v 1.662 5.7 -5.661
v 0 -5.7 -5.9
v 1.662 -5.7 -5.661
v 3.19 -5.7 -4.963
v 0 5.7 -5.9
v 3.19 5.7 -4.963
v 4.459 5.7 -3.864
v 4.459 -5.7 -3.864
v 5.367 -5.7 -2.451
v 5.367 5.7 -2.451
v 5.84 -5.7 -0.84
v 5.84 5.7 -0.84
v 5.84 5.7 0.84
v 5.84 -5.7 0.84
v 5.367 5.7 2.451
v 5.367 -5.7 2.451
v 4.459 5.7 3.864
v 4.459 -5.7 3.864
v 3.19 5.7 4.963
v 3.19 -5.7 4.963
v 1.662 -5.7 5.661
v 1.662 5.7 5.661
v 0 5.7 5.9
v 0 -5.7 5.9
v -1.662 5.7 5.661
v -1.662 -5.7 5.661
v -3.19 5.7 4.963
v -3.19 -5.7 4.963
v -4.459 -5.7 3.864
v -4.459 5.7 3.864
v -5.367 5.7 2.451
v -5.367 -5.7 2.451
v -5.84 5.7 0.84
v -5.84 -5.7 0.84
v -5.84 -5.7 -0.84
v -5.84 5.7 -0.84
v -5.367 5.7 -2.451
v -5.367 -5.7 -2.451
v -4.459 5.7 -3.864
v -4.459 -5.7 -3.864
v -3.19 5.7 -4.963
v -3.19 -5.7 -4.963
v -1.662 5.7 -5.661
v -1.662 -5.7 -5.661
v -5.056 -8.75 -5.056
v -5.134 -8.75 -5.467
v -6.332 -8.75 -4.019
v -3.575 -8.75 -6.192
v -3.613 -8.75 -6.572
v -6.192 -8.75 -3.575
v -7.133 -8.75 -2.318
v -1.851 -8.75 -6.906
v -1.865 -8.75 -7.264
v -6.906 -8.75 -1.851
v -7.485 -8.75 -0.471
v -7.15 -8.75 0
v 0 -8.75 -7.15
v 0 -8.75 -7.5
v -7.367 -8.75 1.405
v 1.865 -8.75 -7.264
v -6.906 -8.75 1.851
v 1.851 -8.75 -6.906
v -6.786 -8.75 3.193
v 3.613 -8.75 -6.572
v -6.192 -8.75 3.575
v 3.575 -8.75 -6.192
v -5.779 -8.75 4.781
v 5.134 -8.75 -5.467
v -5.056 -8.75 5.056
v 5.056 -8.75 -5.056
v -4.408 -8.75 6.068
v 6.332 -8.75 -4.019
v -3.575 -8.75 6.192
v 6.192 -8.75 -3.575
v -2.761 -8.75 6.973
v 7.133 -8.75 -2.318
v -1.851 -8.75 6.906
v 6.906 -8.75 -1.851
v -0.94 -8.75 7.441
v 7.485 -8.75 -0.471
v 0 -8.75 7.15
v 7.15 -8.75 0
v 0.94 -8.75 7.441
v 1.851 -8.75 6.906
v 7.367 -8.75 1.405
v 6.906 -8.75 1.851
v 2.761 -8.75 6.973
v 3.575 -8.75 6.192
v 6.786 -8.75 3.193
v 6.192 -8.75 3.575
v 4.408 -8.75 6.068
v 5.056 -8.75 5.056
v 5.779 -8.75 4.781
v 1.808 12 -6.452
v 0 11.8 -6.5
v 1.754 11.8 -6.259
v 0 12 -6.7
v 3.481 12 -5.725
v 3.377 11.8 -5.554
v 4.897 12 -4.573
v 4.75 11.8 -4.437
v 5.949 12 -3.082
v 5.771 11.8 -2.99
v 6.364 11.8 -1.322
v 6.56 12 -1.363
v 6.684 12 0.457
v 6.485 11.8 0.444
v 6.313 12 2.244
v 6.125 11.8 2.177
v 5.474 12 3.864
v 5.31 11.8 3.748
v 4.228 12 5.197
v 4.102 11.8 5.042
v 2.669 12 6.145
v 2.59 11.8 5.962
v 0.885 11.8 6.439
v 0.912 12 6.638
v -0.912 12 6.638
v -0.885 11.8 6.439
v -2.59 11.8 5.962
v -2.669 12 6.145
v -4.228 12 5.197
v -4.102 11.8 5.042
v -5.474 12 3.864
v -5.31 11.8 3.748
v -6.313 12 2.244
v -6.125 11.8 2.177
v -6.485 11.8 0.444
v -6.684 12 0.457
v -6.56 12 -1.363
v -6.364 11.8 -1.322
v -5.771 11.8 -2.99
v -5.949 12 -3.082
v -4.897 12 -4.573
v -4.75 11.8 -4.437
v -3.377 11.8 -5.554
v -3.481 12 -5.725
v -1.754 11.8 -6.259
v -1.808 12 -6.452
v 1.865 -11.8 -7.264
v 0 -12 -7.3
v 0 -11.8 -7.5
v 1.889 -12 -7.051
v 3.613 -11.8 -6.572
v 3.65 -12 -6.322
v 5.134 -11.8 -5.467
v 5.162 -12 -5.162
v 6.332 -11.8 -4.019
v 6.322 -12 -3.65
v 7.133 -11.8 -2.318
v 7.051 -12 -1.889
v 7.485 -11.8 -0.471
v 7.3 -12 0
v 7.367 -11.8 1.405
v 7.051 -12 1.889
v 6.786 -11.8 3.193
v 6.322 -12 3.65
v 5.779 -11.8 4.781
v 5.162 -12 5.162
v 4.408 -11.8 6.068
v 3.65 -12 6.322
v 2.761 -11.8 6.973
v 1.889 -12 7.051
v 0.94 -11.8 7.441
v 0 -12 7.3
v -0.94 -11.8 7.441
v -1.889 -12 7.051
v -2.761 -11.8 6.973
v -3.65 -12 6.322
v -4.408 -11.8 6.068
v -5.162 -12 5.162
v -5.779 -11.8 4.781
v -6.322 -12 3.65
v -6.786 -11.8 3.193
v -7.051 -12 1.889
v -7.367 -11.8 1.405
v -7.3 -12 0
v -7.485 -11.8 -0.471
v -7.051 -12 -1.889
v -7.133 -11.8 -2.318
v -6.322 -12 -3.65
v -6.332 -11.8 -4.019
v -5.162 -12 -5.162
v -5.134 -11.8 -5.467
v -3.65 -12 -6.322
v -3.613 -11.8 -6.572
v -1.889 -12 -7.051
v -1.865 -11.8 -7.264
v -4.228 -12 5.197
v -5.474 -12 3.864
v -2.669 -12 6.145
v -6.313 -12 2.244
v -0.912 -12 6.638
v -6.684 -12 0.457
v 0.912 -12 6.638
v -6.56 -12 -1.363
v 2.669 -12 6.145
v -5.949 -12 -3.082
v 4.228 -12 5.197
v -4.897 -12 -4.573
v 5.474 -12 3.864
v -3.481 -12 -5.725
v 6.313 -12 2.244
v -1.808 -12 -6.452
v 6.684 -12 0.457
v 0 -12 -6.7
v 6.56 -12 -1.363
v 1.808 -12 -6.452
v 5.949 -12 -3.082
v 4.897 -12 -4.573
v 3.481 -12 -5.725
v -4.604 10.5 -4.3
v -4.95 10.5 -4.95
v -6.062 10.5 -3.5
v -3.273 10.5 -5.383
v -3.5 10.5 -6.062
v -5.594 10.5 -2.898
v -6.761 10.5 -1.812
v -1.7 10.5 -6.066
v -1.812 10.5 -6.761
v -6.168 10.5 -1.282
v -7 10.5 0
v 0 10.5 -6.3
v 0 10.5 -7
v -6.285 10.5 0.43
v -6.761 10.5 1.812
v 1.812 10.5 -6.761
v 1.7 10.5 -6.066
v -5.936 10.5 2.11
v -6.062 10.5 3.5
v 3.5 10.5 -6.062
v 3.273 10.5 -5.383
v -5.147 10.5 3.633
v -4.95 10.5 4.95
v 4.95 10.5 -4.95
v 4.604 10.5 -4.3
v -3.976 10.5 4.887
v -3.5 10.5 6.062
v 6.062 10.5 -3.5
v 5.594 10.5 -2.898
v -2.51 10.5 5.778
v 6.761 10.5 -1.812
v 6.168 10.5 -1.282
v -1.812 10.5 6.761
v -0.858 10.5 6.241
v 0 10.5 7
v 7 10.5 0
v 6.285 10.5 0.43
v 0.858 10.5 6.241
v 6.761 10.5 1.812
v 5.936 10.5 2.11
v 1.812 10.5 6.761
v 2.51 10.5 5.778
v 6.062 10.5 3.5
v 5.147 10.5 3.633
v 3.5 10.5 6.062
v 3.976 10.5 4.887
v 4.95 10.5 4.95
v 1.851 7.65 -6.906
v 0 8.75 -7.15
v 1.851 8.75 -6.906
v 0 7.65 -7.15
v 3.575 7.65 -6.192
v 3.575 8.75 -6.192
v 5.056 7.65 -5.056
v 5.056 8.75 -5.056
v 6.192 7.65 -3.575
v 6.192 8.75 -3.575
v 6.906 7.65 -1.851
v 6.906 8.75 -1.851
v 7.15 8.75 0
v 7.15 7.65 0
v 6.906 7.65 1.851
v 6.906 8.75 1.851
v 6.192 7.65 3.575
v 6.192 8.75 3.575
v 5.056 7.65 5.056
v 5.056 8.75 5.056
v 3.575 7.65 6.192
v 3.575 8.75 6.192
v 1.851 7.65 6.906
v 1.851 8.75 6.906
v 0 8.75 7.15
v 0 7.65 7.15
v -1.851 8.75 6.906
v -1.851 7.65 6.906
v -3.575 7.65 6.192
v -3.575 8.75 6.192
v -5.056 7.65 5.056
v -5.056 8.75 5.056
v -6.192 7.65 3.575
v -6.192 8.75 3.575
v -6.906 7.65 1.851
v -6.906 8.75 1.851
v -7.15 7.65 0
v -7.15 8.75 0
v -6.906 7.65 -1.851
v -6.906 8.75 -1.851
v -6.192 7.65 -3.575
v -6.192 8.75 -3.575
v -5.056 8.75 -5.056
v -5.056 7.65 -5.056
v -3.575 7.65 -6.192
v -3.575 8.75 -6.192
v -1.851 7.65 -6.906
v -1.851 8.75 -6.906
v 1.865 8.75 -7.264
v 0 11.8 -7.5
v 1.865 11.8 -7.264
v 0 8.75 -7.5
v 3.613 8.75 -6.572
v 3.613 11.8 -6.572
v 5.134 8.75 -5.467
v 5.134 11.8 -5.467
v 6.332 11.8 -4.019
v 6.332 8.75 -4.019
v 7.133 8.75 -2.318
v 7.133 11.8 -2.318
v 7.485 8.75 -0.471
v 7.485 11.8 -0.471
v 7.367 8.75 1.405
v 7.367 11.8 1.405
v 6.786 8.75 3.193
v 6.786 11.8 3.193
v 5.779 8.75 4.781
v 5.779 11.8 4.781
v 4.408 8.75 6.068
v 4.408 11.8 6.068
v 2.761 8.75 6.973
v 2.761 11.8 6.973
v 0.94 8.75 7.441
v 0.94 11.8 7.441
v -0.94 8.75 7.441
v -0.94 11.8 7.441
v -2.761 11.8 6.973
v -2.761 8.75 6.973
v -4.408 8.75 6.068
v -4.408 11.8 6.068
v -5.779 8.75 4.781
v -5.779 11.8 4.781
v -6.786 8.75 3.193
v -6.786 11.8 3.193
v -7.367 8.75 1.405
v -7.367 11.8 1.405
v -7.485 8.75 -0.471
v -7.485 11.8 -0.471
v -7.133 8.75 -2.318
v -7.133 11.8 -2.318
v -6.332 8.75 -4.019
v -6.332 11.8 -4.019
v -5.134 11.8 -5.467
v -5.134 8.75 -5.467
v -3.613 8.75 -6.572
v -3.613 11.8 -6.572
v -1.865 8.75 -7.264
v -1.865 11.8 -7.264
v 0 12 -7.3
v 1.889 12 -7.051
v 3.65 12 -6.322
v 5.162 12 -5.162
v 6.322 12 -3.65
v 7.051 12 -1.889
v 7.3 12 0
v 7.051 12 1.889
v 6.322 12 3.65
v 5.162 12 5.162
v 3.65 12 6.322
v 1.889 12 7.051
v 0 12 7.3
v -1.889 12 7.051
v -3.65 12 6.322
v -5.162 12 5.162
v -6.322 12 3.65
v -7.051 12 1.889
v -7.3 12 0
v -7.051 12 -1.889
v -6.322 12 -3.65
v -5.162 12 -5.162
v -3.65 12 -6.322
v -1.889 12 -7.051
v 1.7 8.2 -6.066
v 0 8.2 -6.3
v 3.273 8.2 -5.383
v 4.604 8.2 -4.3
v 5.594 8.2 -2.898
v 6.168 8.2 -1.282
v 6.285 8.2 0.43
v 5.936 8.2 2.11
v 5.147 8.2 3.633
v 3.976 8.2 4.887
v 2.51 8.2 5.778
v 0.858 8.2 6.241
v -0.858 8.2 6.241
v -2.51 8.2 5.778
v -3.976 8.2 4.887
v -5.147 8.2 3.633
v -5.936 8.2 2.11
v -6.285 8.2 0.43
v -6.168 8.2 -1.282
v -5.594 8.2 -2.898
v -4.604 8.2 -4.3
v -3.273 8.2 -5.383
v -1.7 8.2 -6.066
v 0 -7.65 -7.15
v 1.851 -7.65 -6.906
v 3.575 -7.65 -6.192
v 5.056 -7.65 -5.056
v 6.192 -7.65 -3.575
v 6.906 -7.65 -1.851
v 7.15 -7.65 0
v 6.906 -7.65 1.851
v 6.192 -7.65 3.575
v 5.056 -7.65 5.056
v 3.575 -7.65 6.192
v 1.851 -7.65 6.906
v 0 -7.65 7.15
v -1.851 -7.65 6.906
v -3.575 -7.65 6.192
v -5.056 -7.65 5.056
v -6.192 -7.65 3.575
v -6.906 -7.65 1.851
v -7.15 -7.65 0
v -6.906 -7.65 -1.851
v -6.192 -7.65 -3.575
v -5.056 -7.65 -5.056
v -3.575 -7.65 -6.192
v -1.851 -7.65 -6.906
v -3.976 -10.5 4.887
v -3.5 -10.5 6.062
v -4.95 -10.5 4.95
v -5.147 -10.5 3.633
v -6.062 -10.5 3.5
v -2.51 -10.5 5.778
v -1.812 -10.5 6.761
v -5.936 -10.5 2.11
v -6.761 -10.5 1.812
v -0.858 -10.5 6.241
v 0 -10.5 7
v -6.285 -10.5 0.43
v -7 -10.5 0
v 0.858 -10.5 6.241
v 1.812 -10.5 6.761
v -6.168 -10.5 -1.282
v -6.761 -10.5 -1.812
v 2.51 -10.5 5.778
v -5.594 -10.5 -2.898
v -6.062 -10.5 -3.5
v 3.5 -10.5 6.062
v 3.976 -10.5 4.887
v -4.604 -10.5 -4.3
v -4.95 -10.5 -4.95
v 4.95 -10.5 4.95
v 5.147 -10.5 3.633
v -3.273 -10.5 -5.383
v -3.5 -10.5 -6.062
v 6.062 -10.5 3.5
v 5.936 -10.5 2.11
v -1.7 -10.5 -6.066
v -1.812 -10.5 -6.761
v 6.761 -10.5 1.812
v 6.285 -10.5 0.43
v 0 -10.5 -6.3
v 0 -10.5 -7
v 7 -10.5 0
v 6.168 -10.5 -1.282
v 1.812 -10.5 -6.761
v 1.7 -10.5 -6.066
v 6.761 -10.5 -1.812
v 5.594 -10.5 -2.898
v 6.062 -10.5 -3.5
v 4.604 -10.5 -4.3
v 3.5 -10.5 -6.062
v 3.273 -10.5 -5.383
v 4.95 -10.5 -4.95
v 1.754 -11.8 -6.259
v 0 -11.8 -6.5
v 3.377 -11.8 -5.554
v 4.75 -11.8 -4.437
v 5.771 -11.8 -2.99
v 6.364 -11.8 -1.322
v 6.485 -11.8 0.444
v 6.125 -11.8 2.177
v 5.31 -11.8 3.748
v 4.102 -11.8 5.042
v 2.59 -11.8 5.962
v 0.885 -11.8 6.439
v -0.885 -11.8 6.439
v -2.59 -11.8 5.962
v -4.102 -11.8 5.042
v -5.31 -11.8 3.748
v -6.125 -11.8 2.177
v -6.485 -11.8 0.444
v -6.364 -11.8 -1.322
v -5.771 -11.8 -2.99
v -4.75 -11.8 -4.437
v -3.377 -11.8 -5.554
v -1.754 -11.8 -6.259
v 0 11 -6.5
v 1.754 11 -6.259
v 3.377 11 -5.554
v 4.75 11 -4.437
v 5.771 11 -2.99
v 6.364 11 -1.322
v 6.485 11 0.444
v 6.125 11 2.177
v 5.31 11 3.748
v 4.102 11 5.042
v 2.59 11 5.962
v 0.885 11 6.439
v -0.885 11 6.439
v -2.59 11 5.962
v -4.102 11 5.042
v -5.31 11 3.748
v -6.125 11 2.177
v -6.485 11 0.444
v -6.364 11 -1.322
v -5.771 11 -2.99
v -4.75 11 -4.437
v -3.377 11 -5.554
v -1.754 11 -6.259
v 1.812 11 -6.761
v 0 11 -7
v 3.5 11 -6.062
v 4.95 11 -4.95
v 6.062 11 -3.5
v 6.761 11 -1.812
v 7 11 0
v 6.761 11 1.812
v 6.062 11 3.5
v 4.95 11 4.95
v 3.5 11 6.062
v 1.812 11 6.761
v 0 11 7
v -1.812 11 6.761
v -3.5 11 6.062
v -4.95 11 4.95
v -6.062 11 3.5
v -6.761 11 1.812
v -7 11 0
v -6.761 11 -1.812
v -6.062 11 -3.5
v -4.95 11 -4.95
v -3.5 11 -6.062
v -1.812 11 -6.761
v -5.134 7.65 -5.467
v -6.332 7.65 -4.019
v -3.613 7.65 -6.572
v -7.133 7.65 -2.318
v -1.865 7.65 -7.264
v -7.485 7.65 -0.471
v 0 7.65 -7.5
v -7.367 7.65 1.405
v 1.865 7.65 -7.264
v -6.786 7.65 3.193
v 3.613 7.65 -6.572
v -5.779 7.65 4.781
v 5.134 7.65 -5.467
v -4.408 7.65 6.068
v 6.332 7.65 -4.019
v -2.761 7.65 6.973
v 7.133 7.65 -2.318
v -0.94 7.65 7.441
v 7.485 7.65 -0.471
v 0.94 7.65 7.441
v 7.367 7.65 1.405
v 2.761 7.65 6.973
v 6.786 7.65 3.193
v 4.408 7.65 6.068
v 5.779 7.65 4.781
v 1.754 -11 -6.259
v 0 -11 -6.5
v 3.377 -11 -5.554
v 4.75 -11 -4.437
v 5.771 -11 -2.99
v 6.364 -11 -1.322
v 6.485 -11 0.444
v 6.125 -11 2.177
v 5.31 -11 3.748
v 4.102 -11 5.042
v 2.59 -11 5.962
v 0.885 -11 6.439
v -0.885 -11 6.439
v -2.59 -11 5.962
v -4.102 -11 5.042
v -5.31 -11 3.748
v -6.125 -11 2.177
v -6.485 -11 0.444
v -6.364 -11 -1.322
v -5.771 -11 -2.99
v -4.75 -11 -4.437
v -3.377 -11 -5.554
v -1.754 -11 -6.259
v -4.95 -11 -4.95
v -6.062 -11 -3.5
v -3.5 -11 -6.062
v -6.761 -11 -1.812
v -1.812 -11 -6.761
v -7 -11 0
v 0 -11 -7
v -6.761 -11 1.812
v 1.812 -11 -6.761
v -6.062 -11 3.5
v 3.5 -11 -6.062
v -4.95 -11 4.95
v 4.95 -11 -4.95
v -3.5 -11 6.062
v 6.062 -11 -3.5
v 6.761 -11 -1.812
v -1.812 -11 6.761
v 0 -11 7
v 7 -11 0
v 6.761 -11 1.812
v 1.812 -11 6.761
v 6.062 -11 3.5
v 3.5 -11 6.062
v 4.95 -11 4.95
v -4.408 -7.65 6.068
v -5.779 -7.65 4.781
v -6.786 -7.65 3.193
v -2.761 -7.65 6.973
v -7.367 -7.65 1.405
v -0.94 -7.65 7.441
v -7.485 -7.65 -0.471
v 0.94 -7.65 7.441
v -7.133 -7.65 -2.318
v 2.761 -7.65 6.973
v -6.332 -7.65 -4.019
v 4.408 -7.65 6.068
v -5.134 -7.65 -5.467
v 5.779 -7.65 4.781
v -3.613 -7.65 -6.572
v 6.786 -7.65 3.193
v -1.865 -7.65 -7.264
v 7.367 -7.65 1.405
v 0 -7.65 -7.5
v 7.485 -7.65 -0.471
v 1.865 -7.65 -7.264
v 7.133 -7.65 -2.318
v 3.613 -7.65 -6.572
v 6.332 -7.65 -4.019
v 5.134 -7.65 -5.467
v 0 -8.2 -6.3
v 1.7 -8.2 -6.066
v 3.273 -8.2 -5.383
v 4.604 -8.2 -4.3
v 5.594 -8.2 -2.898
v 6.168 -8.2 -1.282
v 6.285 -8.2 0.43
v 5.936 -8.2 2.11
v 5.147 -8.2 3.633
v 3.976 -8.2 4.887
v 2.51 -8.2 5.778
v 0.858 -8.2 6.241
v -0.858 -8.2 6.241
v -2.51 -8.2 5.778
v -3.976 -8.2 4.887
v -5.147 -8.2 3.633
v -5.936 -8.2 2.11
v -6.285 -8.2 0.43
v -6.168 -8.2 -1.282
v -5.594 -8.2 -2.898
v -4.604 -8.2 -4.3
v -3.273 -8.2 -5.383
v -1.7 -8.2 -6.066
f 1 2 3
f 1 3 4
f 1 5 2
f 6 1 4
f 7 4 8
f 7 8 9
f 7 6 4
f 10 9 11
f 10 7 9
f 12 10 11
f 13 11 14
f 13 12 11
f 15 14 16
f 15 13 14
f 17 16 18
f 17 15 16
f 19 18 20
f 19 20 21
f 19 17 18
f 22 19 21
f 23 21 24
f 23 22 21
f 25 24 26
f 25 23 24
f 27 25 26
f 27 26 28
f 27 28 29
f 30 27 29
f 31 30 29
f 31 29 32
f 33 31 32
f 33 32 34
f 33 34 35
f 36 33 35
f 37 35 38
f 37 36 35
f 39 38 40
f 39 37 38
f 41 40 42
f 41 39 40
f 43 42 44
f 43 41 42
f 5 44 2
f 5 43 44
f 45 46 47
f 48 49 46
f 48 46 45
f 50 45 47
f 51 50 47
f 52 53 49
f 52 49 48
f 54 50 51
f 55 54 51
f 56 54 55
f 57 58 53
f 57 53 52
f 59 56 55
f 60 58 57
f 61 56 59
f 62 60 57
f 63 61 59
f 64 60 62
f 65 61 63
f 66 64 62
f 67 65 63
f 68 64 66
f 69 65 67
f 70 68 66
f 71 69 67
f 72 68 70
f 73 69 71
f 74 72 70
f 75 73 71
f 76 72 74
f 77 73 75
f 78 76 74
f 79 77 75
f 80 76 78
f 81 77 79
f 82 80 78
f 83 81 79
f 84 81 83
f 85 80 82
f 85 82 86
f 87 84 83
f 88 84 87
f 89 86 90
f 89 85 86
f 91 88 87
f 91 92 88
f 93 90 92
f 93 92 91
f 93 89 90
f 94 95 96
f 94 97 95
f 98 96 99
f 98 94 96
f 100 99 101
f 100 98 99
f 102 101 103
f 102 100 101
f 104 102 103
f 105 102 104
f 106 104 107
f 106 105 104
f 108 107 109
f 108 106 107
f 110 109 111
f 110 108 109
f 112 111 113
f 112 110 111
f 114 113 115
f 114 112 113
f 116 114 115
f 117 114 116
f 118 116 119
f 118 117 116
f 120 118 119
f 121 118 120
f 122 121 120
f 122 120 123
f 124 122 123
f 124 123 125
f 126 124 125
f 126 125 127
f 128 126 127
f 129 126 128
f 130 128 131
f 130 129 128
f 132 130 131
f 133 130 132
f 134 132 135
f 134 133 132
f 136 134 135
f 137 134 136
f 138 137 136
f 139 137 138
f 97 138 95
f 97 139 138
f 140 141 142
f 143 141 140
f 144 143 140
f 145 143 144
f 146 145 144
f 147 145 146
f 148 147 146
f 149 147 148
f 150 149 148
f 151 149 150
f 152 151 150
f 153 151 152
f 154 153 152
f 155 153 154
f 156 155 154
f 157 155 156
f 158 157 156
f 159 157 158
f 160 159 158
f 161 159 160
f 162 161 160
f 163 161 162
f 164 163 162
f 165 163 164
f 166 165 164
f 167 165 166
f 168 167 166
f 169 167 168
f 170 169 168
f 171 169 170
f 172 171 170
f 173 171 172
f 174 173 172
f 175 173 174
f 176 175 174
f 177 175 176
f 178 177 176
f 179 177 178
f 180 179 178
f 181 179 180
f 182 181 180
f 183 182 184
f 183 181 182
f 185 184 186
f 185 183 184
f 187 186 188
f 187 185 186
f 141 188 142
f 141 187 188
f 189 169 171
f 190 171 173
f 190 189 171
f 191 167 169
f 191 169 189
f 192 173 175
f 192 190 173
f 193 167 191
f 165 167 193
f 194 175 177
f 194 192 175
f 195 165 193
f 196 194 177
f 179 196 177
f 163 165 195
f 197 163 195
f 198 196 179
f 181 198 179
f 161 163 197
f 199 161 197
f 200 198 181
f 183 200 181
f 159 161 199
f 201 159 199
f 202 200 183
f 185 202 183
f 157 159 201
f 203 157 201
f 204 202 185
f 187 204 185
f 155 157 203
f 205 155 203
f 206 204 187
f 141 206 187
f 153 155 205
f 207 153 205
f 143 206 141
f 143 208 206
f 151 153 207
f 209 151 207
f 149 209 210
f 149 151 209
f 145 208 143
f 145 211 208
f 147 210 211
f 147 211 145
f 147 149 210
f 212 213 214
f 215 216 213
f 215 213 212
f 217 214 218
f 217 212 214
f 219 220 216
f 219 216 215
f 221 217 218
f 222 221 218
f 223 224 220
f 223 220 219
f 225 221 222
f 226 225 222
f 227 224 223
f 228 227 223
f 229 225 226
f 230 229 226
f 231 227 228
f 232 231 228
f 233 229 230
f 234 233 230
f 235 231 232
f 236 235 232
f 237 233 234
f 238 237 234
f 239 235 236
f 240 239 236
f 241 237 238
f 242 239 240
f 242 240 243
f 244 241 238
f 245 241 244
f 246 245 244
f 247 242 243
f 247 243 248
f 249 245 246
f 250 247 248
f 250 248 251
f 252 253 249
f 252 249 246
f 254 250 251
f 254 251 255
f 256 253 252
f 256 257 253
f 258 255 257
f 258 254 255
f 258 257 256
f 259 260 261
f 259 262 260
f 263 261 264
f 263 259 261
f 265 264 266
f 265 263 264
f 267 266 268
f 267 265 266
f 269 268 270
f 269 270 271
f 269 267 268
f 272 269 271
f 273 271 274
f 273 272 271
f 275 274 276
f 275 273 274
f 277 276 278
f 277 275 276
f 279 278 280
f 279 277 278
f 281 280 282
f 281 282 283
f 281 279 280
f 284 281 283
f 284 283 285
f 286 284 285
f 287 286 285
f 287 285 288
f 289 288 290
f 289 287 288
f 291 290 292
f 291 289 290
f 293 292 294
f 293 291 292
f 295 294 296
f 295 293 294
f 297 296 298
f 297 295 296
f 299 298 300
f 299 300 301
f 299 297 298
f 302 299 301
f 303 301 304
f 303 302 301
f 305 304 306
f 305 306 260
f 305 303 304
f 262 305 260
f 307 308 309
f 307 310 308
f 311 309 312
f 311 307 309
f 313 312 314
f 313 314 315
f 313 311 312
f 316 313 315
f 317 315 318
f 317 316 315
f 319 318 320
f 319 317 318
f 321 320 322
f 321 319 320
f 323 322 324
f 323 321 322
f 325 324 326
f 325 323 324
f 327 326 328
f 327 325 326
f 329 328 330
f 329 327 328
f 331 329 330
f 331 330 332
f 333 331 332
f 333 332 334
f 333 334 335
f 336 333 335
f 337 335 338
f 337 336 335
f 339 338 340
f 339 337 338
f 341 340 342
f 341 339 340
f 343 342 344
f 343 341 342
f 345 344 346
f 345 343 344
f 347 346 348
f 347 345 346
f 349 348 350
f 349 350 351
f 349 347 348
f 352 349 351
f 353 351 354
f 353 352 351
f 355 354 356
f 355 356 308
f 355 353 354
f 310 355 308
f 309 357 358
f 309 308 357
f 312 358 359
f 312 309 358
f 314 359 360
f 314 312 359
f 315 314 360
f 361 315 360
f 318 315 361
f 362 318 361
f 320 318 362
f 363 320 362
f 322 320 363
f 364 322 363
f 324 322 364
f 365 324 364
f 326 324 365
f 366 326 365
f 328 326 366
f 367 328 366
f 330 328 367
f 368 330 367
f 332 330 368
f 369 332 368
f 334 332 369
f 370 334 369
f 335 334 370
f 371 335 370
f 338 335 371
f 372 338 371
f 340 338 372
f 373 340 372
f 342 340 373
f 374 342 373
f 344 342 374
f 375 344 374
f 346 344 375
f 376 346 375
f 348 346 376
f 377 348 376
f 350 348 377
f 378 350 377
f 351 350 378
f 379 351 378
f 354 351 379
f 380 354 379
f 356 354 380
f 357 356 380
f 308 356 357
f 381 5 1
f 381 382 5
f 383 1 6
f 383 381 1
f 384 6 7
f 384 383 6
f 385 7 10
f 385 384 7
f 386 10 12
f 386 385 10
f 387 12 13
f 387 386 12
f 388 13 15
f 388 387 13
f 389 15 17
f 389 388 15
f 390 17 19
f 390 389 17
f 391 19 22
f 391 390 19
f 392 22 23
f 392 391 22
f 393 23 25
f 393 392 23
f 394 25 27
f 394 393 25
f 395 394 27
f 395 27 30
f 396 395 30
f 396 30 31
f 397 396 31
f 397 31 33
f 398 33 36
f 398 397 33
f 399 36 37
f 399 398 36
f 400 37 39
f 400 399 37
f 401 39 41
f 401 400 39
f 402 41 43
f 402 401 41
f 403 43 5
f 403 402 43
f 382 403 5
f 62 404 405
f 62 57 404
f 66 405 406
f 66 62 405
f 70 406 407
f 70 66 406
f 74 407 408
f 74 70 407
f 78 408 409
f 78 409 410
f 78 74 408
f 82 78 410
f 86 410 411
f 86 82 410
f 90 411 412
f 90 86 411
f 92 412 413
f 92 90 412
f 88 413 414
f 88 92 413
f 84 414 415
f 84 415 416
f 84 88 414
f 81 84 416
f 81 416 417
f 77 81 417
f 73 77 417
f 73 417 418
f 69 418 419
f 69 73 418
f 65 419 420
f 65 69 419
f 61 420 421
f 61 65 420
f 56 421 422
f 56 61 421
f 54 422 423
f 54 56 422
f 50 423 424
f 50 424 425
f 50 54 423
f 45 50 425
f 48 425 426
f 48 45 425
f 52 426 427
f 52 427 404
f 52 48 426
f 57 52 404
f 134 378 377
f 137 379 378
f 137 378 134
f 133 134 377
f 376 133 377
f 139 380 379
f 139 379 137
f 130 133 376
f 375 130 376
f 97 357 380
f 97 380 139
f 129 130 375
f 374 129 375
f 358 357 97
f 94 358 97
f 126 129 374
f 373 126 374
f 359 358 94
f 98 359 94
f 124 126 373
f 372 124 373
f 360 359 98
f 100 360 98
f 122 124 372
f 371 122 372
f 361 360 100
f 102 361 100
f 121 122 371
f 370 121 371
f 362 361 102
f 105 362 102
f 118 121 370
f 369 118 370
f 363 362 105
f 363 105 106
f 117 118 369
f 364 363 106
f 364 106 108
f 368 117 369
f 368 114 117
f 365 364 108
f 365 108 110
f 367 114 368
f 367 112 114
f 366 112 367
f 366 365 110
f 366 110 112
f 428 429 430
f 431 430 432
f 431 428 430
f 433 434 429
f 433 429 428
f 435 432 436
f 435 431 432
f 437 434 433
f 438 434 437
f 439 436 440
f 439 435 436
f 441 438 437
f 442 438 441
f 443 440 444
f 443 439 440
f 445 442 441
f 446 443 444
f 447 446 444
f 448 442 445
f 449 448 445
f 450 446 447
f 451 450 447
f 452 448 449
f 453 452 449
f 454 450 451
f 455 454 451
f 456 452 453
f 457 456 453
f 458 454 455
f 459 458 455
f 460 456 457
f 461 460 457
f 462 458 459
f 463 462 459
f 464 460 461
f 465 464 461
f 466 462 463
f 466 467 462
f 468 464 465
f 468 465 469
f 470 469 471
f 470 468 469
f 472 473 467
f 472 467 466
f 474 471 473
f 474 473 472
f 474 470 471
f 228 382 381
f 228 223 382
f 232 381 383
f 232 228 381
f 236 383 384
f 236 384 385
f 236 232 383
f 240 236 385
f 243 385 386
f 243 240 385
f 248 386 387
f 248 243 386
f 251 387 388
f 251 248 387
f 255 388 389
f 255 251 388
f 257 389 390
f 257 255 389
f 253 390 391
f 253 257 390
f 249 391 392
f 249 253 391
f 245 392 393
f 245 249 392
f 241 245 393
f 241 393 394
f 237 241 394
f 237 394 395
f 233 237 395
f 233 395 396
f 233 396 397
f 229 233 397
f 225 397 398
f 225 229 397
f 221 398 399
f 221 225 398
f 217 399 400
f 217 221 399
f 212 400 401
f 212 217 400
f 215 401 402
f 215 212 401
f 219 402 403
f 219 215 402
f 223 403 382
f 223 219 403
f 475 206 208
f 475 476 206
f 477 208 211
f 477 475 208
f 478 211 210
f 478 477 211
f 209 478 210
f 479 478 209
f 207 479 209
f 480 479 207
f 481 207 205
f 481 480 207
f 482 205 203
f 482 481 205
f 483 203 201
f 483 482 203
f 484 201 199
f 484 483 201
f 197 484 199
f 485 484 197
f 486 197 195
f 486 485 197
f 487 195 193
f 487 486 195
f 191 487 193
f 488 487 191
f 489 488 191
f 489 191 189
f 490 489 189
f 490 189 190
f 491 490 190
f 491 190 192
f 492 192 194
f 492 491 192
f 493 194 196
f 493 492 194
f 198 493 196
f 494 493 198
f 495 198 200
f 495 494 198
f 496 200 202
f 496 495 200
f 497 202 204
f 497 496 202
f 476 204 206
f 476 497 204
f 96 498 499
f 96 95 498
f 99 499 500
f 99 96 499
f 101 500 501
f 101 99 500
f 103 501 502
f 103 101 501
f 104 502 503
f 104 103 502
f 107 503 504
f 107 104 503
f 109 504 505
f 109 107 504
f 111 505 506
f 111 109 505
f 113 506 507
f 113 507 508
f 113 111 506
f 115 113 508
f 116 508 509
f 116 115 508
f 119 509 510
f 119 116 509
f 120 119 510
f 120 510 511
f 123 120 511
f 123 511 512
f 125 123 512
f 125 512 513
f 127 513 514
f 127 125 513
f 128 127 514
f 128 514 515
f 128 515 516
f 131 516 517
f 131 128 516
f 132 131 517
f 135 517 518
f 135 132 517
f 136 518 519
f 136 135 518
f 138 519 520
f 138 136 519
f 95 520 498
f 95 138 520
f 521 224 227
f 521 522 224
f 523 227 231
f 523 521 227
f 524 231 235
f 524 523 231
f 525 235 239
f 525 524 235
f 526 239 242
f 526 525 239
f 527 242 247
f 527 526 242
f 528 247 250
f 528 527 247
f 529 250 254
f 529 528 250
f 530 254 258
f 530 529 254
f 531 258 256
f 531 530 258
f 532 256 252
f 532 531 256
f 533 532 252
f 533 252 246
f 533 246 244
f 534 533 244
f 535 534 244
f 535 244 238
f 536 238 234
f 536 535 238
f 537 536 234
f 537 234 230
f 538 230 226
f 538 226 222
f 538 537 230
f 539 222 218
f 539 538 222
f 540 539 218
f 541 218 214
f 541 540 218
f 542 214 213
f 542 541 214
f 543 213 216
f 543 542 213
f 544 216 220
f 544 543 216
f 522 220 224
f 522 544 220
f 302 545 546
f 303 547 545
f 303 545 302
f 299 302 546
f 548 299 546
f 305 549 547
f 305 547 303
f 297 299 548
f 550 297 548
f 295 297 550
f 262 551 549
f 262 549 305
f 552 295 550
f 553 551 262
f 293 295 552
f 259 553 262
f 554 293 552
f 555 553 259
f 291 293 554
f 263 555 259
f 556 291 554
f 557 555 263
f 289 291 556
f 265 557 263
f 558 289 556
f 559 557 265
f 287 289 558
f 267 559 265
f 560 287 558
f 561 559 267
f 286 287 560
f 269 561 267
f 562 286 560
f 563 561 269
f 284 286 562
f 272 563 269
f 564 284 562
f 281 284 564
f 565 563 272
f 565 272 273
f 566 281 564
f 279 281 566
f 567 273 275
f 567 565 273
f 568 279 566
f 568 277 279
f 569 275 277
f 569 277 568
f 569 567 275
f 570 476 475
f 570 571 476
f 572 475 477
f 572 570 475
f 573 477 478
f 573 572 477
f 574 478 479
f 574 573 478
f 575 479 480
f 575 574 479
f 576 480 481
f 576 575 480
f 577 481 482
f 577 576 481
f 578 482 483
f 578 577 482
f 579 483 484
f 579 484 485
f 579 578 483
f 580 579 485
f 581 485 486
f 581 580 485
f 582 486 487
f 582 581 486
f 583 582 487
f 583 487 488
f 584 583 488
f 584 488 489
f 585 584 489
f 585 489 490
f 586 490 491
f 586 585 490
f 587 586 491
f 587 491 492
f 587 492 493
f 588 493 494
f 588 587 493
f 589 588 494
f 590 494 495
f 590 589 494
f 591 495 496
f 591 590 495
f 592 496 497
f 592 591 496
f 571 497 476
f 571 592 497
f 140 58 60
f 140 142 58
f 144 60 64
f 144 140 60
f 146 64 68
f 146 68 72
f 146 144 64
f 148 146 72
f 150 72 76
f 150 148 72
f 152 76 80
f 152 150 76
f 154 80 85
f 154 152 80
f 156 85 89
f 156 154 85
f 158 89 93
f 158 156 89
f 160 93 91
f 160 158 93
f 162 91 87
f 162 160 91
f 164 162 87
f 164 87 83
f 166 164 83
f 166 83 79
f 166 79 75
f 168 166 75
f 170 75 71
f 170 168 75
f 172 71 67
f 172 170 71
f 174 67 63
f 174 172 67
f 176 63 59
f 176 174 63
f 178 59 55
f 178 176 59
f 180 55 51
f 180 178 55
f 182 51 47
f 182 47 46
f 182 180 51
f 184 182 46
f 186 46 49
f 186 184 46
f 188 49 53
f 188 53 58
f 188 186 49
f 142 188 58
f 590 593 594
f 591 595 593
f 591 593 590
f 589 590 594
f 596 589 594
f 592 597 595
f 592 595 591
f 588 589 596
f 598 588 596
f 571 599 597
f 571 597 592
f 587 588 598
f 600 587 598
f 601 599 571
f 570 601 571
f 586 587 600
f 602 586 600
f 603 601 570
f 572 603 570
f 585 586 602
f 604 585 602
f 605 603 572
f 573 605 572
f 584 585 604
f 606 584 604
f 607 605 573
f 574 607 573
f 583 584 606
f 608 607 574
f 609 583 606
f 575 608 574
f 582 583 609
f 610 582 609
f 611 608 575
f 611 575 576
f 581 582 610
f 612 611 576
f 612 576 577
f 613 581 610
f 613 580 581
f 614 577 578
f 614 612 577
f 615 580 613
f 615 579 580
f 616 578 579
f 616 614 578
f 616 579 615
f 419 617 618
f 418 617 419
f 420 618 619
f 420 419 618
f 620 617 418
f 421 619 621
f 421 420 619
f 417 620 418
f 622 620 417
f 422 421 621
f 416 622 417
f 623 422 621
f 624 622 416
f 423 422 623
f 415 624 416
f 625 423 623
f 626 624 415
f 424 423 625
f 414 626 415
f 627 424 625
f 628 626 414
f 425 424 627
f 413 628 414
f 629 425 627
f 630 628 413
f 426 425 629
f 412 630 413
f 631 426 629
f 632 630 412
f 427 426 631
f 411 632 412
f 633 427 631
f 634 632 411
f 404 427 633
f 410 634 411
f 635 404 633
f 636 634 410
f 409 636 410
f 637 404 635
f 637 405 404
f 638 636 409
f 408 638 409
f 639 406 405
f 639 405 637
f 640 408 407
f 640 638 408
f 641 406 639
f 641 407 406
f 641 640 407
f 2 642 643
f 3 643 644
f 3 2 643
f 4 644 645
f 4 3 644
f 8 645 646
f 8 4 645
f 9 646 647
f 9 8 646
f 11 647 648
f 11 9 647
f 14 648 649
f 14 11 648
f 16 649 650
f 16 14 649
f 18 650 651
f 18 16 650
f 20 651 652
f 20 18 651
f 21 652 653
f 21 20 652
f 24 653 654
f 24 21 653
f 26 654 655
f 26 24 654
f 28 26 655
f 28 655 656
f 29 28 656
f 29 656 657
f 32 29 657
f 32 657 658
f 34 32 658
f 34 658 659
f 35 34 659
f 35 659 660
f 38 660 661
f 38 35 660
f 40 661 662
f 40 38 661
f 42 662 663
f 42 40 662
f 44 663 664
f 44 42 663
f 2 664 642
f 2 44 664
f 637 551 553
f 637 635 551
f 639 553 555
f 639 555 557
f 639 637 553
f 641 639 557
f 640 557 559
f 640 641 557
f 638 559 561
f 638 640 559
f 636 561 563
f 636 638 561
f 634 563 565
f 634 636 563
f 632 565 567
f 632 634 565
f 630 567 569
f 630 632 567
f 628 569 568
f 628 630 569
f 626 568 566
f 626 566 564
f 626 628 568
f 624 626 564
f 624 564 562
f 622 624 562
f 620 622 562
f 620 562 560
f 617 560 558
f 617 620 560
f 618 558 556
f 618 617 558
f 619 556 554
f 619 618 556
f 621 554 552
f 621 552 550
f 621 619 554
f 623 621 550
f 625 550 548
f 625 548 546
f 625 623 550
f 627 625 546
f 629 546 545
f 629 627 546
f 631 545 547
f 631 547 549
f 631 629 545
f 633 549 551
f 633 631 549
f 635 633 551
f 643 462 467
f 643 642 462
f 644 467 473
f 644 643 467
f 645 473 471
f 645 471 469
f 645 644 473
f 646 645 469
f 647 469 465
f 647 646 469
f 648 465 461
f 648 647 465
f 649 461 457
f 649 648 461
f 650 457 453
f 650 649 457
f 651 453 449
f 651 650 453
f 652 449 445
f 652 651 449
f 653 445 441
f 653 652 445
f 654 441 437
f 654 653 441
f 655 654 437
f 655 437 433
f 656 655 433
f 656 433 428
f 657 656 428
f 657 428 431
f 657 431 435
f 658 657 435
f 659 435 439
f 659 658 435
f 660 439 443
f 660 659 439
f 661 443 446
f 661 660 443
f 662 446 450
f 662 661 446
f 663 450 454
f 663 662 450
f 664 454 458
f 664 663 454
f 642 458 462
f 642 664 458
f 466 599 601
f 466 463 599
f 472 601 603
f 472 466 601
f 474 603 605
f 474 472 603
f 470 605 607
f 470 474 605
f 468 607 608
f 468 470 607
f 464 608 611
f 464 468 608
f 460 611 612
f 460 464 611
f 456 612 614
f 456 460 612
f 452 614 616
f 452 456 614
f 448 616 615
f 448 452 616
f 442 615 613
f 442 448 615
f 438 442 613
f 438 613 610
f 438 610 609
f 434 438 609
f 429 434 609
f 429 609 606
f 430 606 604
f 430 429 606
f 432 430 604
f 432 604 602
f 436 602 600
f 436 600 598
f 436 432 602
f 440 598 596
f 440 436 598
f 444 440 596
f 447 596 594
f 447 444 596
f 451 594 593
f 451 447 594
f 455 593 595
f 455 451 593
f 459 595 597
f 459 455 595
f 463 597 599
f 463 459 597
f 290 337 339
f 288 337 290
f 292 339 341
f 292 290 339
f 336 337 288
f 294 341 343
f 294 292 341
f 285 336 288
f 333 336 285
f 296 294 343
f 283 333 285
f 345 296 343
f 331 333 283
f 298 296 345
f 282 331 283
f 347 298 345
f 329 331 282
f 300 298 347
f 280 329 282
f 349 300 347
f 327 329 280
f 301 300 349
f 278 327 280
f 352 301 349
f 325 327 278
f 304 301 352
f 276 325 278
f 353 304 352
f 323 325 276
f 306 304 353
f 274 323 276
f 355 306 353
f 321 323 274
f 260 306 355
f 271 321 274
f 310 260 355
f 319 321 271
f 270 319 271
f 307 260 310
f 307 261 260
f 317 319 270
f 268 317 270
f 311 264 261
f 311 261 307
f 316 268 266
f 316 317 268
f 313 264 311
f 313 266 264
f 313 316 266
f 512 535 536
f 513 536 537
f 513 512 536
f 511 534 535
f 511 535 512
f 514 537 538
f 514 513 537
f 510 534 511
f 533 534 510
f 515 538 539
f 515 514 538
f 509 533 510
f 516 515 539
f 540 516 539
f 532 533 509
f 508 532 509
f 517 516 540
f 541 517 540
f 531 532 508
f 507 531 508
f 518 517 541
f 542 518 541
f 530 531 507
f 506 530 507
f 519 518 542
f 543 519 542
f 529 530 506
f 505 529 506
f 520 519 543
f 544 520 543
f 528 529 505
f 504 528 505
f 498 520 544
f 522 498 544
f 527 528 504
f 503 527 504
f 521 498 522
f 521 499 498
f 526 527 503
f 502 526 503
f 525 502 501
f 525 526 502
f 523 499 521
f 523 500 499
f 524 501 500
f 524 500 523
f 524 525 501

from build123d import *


with BuildPart() as part:
    # Sketch1 → Revolve1 (revolve)
    with BuildSketch(Plane(origin=(0, 0, 0), x_dir=(0, 0, -1), z_dir=(1, 0, 0))):
        Polygon((6.7, 12), (7.3, 12), (7.5, 11.8), (7.5, 8.75), (7.15, 8.75), (7.15, 7.65), (7.5, 7.65), (7.5, -7.65), (7.15, -7.65), (7.15, -8.75), (7.5, -8.75), (7.5, -11.8), (7.3, -12), (6.7, -12), (6.5, -11.8), (6.5, -11), (7, -11), (7, -10.5), (6.3, -10.5), (6.3, -8.2), (5.9, -5.7), (5.9, 5.7), (6.3, 8.2), (6.3, 10.5), (7, 10.5), (7, 11), (6.5, 11), (6.5, 11.8), align=None)
    revolve(axis=Axis((0, 12, 0), (0, -1, 0)))


solid = part.part
